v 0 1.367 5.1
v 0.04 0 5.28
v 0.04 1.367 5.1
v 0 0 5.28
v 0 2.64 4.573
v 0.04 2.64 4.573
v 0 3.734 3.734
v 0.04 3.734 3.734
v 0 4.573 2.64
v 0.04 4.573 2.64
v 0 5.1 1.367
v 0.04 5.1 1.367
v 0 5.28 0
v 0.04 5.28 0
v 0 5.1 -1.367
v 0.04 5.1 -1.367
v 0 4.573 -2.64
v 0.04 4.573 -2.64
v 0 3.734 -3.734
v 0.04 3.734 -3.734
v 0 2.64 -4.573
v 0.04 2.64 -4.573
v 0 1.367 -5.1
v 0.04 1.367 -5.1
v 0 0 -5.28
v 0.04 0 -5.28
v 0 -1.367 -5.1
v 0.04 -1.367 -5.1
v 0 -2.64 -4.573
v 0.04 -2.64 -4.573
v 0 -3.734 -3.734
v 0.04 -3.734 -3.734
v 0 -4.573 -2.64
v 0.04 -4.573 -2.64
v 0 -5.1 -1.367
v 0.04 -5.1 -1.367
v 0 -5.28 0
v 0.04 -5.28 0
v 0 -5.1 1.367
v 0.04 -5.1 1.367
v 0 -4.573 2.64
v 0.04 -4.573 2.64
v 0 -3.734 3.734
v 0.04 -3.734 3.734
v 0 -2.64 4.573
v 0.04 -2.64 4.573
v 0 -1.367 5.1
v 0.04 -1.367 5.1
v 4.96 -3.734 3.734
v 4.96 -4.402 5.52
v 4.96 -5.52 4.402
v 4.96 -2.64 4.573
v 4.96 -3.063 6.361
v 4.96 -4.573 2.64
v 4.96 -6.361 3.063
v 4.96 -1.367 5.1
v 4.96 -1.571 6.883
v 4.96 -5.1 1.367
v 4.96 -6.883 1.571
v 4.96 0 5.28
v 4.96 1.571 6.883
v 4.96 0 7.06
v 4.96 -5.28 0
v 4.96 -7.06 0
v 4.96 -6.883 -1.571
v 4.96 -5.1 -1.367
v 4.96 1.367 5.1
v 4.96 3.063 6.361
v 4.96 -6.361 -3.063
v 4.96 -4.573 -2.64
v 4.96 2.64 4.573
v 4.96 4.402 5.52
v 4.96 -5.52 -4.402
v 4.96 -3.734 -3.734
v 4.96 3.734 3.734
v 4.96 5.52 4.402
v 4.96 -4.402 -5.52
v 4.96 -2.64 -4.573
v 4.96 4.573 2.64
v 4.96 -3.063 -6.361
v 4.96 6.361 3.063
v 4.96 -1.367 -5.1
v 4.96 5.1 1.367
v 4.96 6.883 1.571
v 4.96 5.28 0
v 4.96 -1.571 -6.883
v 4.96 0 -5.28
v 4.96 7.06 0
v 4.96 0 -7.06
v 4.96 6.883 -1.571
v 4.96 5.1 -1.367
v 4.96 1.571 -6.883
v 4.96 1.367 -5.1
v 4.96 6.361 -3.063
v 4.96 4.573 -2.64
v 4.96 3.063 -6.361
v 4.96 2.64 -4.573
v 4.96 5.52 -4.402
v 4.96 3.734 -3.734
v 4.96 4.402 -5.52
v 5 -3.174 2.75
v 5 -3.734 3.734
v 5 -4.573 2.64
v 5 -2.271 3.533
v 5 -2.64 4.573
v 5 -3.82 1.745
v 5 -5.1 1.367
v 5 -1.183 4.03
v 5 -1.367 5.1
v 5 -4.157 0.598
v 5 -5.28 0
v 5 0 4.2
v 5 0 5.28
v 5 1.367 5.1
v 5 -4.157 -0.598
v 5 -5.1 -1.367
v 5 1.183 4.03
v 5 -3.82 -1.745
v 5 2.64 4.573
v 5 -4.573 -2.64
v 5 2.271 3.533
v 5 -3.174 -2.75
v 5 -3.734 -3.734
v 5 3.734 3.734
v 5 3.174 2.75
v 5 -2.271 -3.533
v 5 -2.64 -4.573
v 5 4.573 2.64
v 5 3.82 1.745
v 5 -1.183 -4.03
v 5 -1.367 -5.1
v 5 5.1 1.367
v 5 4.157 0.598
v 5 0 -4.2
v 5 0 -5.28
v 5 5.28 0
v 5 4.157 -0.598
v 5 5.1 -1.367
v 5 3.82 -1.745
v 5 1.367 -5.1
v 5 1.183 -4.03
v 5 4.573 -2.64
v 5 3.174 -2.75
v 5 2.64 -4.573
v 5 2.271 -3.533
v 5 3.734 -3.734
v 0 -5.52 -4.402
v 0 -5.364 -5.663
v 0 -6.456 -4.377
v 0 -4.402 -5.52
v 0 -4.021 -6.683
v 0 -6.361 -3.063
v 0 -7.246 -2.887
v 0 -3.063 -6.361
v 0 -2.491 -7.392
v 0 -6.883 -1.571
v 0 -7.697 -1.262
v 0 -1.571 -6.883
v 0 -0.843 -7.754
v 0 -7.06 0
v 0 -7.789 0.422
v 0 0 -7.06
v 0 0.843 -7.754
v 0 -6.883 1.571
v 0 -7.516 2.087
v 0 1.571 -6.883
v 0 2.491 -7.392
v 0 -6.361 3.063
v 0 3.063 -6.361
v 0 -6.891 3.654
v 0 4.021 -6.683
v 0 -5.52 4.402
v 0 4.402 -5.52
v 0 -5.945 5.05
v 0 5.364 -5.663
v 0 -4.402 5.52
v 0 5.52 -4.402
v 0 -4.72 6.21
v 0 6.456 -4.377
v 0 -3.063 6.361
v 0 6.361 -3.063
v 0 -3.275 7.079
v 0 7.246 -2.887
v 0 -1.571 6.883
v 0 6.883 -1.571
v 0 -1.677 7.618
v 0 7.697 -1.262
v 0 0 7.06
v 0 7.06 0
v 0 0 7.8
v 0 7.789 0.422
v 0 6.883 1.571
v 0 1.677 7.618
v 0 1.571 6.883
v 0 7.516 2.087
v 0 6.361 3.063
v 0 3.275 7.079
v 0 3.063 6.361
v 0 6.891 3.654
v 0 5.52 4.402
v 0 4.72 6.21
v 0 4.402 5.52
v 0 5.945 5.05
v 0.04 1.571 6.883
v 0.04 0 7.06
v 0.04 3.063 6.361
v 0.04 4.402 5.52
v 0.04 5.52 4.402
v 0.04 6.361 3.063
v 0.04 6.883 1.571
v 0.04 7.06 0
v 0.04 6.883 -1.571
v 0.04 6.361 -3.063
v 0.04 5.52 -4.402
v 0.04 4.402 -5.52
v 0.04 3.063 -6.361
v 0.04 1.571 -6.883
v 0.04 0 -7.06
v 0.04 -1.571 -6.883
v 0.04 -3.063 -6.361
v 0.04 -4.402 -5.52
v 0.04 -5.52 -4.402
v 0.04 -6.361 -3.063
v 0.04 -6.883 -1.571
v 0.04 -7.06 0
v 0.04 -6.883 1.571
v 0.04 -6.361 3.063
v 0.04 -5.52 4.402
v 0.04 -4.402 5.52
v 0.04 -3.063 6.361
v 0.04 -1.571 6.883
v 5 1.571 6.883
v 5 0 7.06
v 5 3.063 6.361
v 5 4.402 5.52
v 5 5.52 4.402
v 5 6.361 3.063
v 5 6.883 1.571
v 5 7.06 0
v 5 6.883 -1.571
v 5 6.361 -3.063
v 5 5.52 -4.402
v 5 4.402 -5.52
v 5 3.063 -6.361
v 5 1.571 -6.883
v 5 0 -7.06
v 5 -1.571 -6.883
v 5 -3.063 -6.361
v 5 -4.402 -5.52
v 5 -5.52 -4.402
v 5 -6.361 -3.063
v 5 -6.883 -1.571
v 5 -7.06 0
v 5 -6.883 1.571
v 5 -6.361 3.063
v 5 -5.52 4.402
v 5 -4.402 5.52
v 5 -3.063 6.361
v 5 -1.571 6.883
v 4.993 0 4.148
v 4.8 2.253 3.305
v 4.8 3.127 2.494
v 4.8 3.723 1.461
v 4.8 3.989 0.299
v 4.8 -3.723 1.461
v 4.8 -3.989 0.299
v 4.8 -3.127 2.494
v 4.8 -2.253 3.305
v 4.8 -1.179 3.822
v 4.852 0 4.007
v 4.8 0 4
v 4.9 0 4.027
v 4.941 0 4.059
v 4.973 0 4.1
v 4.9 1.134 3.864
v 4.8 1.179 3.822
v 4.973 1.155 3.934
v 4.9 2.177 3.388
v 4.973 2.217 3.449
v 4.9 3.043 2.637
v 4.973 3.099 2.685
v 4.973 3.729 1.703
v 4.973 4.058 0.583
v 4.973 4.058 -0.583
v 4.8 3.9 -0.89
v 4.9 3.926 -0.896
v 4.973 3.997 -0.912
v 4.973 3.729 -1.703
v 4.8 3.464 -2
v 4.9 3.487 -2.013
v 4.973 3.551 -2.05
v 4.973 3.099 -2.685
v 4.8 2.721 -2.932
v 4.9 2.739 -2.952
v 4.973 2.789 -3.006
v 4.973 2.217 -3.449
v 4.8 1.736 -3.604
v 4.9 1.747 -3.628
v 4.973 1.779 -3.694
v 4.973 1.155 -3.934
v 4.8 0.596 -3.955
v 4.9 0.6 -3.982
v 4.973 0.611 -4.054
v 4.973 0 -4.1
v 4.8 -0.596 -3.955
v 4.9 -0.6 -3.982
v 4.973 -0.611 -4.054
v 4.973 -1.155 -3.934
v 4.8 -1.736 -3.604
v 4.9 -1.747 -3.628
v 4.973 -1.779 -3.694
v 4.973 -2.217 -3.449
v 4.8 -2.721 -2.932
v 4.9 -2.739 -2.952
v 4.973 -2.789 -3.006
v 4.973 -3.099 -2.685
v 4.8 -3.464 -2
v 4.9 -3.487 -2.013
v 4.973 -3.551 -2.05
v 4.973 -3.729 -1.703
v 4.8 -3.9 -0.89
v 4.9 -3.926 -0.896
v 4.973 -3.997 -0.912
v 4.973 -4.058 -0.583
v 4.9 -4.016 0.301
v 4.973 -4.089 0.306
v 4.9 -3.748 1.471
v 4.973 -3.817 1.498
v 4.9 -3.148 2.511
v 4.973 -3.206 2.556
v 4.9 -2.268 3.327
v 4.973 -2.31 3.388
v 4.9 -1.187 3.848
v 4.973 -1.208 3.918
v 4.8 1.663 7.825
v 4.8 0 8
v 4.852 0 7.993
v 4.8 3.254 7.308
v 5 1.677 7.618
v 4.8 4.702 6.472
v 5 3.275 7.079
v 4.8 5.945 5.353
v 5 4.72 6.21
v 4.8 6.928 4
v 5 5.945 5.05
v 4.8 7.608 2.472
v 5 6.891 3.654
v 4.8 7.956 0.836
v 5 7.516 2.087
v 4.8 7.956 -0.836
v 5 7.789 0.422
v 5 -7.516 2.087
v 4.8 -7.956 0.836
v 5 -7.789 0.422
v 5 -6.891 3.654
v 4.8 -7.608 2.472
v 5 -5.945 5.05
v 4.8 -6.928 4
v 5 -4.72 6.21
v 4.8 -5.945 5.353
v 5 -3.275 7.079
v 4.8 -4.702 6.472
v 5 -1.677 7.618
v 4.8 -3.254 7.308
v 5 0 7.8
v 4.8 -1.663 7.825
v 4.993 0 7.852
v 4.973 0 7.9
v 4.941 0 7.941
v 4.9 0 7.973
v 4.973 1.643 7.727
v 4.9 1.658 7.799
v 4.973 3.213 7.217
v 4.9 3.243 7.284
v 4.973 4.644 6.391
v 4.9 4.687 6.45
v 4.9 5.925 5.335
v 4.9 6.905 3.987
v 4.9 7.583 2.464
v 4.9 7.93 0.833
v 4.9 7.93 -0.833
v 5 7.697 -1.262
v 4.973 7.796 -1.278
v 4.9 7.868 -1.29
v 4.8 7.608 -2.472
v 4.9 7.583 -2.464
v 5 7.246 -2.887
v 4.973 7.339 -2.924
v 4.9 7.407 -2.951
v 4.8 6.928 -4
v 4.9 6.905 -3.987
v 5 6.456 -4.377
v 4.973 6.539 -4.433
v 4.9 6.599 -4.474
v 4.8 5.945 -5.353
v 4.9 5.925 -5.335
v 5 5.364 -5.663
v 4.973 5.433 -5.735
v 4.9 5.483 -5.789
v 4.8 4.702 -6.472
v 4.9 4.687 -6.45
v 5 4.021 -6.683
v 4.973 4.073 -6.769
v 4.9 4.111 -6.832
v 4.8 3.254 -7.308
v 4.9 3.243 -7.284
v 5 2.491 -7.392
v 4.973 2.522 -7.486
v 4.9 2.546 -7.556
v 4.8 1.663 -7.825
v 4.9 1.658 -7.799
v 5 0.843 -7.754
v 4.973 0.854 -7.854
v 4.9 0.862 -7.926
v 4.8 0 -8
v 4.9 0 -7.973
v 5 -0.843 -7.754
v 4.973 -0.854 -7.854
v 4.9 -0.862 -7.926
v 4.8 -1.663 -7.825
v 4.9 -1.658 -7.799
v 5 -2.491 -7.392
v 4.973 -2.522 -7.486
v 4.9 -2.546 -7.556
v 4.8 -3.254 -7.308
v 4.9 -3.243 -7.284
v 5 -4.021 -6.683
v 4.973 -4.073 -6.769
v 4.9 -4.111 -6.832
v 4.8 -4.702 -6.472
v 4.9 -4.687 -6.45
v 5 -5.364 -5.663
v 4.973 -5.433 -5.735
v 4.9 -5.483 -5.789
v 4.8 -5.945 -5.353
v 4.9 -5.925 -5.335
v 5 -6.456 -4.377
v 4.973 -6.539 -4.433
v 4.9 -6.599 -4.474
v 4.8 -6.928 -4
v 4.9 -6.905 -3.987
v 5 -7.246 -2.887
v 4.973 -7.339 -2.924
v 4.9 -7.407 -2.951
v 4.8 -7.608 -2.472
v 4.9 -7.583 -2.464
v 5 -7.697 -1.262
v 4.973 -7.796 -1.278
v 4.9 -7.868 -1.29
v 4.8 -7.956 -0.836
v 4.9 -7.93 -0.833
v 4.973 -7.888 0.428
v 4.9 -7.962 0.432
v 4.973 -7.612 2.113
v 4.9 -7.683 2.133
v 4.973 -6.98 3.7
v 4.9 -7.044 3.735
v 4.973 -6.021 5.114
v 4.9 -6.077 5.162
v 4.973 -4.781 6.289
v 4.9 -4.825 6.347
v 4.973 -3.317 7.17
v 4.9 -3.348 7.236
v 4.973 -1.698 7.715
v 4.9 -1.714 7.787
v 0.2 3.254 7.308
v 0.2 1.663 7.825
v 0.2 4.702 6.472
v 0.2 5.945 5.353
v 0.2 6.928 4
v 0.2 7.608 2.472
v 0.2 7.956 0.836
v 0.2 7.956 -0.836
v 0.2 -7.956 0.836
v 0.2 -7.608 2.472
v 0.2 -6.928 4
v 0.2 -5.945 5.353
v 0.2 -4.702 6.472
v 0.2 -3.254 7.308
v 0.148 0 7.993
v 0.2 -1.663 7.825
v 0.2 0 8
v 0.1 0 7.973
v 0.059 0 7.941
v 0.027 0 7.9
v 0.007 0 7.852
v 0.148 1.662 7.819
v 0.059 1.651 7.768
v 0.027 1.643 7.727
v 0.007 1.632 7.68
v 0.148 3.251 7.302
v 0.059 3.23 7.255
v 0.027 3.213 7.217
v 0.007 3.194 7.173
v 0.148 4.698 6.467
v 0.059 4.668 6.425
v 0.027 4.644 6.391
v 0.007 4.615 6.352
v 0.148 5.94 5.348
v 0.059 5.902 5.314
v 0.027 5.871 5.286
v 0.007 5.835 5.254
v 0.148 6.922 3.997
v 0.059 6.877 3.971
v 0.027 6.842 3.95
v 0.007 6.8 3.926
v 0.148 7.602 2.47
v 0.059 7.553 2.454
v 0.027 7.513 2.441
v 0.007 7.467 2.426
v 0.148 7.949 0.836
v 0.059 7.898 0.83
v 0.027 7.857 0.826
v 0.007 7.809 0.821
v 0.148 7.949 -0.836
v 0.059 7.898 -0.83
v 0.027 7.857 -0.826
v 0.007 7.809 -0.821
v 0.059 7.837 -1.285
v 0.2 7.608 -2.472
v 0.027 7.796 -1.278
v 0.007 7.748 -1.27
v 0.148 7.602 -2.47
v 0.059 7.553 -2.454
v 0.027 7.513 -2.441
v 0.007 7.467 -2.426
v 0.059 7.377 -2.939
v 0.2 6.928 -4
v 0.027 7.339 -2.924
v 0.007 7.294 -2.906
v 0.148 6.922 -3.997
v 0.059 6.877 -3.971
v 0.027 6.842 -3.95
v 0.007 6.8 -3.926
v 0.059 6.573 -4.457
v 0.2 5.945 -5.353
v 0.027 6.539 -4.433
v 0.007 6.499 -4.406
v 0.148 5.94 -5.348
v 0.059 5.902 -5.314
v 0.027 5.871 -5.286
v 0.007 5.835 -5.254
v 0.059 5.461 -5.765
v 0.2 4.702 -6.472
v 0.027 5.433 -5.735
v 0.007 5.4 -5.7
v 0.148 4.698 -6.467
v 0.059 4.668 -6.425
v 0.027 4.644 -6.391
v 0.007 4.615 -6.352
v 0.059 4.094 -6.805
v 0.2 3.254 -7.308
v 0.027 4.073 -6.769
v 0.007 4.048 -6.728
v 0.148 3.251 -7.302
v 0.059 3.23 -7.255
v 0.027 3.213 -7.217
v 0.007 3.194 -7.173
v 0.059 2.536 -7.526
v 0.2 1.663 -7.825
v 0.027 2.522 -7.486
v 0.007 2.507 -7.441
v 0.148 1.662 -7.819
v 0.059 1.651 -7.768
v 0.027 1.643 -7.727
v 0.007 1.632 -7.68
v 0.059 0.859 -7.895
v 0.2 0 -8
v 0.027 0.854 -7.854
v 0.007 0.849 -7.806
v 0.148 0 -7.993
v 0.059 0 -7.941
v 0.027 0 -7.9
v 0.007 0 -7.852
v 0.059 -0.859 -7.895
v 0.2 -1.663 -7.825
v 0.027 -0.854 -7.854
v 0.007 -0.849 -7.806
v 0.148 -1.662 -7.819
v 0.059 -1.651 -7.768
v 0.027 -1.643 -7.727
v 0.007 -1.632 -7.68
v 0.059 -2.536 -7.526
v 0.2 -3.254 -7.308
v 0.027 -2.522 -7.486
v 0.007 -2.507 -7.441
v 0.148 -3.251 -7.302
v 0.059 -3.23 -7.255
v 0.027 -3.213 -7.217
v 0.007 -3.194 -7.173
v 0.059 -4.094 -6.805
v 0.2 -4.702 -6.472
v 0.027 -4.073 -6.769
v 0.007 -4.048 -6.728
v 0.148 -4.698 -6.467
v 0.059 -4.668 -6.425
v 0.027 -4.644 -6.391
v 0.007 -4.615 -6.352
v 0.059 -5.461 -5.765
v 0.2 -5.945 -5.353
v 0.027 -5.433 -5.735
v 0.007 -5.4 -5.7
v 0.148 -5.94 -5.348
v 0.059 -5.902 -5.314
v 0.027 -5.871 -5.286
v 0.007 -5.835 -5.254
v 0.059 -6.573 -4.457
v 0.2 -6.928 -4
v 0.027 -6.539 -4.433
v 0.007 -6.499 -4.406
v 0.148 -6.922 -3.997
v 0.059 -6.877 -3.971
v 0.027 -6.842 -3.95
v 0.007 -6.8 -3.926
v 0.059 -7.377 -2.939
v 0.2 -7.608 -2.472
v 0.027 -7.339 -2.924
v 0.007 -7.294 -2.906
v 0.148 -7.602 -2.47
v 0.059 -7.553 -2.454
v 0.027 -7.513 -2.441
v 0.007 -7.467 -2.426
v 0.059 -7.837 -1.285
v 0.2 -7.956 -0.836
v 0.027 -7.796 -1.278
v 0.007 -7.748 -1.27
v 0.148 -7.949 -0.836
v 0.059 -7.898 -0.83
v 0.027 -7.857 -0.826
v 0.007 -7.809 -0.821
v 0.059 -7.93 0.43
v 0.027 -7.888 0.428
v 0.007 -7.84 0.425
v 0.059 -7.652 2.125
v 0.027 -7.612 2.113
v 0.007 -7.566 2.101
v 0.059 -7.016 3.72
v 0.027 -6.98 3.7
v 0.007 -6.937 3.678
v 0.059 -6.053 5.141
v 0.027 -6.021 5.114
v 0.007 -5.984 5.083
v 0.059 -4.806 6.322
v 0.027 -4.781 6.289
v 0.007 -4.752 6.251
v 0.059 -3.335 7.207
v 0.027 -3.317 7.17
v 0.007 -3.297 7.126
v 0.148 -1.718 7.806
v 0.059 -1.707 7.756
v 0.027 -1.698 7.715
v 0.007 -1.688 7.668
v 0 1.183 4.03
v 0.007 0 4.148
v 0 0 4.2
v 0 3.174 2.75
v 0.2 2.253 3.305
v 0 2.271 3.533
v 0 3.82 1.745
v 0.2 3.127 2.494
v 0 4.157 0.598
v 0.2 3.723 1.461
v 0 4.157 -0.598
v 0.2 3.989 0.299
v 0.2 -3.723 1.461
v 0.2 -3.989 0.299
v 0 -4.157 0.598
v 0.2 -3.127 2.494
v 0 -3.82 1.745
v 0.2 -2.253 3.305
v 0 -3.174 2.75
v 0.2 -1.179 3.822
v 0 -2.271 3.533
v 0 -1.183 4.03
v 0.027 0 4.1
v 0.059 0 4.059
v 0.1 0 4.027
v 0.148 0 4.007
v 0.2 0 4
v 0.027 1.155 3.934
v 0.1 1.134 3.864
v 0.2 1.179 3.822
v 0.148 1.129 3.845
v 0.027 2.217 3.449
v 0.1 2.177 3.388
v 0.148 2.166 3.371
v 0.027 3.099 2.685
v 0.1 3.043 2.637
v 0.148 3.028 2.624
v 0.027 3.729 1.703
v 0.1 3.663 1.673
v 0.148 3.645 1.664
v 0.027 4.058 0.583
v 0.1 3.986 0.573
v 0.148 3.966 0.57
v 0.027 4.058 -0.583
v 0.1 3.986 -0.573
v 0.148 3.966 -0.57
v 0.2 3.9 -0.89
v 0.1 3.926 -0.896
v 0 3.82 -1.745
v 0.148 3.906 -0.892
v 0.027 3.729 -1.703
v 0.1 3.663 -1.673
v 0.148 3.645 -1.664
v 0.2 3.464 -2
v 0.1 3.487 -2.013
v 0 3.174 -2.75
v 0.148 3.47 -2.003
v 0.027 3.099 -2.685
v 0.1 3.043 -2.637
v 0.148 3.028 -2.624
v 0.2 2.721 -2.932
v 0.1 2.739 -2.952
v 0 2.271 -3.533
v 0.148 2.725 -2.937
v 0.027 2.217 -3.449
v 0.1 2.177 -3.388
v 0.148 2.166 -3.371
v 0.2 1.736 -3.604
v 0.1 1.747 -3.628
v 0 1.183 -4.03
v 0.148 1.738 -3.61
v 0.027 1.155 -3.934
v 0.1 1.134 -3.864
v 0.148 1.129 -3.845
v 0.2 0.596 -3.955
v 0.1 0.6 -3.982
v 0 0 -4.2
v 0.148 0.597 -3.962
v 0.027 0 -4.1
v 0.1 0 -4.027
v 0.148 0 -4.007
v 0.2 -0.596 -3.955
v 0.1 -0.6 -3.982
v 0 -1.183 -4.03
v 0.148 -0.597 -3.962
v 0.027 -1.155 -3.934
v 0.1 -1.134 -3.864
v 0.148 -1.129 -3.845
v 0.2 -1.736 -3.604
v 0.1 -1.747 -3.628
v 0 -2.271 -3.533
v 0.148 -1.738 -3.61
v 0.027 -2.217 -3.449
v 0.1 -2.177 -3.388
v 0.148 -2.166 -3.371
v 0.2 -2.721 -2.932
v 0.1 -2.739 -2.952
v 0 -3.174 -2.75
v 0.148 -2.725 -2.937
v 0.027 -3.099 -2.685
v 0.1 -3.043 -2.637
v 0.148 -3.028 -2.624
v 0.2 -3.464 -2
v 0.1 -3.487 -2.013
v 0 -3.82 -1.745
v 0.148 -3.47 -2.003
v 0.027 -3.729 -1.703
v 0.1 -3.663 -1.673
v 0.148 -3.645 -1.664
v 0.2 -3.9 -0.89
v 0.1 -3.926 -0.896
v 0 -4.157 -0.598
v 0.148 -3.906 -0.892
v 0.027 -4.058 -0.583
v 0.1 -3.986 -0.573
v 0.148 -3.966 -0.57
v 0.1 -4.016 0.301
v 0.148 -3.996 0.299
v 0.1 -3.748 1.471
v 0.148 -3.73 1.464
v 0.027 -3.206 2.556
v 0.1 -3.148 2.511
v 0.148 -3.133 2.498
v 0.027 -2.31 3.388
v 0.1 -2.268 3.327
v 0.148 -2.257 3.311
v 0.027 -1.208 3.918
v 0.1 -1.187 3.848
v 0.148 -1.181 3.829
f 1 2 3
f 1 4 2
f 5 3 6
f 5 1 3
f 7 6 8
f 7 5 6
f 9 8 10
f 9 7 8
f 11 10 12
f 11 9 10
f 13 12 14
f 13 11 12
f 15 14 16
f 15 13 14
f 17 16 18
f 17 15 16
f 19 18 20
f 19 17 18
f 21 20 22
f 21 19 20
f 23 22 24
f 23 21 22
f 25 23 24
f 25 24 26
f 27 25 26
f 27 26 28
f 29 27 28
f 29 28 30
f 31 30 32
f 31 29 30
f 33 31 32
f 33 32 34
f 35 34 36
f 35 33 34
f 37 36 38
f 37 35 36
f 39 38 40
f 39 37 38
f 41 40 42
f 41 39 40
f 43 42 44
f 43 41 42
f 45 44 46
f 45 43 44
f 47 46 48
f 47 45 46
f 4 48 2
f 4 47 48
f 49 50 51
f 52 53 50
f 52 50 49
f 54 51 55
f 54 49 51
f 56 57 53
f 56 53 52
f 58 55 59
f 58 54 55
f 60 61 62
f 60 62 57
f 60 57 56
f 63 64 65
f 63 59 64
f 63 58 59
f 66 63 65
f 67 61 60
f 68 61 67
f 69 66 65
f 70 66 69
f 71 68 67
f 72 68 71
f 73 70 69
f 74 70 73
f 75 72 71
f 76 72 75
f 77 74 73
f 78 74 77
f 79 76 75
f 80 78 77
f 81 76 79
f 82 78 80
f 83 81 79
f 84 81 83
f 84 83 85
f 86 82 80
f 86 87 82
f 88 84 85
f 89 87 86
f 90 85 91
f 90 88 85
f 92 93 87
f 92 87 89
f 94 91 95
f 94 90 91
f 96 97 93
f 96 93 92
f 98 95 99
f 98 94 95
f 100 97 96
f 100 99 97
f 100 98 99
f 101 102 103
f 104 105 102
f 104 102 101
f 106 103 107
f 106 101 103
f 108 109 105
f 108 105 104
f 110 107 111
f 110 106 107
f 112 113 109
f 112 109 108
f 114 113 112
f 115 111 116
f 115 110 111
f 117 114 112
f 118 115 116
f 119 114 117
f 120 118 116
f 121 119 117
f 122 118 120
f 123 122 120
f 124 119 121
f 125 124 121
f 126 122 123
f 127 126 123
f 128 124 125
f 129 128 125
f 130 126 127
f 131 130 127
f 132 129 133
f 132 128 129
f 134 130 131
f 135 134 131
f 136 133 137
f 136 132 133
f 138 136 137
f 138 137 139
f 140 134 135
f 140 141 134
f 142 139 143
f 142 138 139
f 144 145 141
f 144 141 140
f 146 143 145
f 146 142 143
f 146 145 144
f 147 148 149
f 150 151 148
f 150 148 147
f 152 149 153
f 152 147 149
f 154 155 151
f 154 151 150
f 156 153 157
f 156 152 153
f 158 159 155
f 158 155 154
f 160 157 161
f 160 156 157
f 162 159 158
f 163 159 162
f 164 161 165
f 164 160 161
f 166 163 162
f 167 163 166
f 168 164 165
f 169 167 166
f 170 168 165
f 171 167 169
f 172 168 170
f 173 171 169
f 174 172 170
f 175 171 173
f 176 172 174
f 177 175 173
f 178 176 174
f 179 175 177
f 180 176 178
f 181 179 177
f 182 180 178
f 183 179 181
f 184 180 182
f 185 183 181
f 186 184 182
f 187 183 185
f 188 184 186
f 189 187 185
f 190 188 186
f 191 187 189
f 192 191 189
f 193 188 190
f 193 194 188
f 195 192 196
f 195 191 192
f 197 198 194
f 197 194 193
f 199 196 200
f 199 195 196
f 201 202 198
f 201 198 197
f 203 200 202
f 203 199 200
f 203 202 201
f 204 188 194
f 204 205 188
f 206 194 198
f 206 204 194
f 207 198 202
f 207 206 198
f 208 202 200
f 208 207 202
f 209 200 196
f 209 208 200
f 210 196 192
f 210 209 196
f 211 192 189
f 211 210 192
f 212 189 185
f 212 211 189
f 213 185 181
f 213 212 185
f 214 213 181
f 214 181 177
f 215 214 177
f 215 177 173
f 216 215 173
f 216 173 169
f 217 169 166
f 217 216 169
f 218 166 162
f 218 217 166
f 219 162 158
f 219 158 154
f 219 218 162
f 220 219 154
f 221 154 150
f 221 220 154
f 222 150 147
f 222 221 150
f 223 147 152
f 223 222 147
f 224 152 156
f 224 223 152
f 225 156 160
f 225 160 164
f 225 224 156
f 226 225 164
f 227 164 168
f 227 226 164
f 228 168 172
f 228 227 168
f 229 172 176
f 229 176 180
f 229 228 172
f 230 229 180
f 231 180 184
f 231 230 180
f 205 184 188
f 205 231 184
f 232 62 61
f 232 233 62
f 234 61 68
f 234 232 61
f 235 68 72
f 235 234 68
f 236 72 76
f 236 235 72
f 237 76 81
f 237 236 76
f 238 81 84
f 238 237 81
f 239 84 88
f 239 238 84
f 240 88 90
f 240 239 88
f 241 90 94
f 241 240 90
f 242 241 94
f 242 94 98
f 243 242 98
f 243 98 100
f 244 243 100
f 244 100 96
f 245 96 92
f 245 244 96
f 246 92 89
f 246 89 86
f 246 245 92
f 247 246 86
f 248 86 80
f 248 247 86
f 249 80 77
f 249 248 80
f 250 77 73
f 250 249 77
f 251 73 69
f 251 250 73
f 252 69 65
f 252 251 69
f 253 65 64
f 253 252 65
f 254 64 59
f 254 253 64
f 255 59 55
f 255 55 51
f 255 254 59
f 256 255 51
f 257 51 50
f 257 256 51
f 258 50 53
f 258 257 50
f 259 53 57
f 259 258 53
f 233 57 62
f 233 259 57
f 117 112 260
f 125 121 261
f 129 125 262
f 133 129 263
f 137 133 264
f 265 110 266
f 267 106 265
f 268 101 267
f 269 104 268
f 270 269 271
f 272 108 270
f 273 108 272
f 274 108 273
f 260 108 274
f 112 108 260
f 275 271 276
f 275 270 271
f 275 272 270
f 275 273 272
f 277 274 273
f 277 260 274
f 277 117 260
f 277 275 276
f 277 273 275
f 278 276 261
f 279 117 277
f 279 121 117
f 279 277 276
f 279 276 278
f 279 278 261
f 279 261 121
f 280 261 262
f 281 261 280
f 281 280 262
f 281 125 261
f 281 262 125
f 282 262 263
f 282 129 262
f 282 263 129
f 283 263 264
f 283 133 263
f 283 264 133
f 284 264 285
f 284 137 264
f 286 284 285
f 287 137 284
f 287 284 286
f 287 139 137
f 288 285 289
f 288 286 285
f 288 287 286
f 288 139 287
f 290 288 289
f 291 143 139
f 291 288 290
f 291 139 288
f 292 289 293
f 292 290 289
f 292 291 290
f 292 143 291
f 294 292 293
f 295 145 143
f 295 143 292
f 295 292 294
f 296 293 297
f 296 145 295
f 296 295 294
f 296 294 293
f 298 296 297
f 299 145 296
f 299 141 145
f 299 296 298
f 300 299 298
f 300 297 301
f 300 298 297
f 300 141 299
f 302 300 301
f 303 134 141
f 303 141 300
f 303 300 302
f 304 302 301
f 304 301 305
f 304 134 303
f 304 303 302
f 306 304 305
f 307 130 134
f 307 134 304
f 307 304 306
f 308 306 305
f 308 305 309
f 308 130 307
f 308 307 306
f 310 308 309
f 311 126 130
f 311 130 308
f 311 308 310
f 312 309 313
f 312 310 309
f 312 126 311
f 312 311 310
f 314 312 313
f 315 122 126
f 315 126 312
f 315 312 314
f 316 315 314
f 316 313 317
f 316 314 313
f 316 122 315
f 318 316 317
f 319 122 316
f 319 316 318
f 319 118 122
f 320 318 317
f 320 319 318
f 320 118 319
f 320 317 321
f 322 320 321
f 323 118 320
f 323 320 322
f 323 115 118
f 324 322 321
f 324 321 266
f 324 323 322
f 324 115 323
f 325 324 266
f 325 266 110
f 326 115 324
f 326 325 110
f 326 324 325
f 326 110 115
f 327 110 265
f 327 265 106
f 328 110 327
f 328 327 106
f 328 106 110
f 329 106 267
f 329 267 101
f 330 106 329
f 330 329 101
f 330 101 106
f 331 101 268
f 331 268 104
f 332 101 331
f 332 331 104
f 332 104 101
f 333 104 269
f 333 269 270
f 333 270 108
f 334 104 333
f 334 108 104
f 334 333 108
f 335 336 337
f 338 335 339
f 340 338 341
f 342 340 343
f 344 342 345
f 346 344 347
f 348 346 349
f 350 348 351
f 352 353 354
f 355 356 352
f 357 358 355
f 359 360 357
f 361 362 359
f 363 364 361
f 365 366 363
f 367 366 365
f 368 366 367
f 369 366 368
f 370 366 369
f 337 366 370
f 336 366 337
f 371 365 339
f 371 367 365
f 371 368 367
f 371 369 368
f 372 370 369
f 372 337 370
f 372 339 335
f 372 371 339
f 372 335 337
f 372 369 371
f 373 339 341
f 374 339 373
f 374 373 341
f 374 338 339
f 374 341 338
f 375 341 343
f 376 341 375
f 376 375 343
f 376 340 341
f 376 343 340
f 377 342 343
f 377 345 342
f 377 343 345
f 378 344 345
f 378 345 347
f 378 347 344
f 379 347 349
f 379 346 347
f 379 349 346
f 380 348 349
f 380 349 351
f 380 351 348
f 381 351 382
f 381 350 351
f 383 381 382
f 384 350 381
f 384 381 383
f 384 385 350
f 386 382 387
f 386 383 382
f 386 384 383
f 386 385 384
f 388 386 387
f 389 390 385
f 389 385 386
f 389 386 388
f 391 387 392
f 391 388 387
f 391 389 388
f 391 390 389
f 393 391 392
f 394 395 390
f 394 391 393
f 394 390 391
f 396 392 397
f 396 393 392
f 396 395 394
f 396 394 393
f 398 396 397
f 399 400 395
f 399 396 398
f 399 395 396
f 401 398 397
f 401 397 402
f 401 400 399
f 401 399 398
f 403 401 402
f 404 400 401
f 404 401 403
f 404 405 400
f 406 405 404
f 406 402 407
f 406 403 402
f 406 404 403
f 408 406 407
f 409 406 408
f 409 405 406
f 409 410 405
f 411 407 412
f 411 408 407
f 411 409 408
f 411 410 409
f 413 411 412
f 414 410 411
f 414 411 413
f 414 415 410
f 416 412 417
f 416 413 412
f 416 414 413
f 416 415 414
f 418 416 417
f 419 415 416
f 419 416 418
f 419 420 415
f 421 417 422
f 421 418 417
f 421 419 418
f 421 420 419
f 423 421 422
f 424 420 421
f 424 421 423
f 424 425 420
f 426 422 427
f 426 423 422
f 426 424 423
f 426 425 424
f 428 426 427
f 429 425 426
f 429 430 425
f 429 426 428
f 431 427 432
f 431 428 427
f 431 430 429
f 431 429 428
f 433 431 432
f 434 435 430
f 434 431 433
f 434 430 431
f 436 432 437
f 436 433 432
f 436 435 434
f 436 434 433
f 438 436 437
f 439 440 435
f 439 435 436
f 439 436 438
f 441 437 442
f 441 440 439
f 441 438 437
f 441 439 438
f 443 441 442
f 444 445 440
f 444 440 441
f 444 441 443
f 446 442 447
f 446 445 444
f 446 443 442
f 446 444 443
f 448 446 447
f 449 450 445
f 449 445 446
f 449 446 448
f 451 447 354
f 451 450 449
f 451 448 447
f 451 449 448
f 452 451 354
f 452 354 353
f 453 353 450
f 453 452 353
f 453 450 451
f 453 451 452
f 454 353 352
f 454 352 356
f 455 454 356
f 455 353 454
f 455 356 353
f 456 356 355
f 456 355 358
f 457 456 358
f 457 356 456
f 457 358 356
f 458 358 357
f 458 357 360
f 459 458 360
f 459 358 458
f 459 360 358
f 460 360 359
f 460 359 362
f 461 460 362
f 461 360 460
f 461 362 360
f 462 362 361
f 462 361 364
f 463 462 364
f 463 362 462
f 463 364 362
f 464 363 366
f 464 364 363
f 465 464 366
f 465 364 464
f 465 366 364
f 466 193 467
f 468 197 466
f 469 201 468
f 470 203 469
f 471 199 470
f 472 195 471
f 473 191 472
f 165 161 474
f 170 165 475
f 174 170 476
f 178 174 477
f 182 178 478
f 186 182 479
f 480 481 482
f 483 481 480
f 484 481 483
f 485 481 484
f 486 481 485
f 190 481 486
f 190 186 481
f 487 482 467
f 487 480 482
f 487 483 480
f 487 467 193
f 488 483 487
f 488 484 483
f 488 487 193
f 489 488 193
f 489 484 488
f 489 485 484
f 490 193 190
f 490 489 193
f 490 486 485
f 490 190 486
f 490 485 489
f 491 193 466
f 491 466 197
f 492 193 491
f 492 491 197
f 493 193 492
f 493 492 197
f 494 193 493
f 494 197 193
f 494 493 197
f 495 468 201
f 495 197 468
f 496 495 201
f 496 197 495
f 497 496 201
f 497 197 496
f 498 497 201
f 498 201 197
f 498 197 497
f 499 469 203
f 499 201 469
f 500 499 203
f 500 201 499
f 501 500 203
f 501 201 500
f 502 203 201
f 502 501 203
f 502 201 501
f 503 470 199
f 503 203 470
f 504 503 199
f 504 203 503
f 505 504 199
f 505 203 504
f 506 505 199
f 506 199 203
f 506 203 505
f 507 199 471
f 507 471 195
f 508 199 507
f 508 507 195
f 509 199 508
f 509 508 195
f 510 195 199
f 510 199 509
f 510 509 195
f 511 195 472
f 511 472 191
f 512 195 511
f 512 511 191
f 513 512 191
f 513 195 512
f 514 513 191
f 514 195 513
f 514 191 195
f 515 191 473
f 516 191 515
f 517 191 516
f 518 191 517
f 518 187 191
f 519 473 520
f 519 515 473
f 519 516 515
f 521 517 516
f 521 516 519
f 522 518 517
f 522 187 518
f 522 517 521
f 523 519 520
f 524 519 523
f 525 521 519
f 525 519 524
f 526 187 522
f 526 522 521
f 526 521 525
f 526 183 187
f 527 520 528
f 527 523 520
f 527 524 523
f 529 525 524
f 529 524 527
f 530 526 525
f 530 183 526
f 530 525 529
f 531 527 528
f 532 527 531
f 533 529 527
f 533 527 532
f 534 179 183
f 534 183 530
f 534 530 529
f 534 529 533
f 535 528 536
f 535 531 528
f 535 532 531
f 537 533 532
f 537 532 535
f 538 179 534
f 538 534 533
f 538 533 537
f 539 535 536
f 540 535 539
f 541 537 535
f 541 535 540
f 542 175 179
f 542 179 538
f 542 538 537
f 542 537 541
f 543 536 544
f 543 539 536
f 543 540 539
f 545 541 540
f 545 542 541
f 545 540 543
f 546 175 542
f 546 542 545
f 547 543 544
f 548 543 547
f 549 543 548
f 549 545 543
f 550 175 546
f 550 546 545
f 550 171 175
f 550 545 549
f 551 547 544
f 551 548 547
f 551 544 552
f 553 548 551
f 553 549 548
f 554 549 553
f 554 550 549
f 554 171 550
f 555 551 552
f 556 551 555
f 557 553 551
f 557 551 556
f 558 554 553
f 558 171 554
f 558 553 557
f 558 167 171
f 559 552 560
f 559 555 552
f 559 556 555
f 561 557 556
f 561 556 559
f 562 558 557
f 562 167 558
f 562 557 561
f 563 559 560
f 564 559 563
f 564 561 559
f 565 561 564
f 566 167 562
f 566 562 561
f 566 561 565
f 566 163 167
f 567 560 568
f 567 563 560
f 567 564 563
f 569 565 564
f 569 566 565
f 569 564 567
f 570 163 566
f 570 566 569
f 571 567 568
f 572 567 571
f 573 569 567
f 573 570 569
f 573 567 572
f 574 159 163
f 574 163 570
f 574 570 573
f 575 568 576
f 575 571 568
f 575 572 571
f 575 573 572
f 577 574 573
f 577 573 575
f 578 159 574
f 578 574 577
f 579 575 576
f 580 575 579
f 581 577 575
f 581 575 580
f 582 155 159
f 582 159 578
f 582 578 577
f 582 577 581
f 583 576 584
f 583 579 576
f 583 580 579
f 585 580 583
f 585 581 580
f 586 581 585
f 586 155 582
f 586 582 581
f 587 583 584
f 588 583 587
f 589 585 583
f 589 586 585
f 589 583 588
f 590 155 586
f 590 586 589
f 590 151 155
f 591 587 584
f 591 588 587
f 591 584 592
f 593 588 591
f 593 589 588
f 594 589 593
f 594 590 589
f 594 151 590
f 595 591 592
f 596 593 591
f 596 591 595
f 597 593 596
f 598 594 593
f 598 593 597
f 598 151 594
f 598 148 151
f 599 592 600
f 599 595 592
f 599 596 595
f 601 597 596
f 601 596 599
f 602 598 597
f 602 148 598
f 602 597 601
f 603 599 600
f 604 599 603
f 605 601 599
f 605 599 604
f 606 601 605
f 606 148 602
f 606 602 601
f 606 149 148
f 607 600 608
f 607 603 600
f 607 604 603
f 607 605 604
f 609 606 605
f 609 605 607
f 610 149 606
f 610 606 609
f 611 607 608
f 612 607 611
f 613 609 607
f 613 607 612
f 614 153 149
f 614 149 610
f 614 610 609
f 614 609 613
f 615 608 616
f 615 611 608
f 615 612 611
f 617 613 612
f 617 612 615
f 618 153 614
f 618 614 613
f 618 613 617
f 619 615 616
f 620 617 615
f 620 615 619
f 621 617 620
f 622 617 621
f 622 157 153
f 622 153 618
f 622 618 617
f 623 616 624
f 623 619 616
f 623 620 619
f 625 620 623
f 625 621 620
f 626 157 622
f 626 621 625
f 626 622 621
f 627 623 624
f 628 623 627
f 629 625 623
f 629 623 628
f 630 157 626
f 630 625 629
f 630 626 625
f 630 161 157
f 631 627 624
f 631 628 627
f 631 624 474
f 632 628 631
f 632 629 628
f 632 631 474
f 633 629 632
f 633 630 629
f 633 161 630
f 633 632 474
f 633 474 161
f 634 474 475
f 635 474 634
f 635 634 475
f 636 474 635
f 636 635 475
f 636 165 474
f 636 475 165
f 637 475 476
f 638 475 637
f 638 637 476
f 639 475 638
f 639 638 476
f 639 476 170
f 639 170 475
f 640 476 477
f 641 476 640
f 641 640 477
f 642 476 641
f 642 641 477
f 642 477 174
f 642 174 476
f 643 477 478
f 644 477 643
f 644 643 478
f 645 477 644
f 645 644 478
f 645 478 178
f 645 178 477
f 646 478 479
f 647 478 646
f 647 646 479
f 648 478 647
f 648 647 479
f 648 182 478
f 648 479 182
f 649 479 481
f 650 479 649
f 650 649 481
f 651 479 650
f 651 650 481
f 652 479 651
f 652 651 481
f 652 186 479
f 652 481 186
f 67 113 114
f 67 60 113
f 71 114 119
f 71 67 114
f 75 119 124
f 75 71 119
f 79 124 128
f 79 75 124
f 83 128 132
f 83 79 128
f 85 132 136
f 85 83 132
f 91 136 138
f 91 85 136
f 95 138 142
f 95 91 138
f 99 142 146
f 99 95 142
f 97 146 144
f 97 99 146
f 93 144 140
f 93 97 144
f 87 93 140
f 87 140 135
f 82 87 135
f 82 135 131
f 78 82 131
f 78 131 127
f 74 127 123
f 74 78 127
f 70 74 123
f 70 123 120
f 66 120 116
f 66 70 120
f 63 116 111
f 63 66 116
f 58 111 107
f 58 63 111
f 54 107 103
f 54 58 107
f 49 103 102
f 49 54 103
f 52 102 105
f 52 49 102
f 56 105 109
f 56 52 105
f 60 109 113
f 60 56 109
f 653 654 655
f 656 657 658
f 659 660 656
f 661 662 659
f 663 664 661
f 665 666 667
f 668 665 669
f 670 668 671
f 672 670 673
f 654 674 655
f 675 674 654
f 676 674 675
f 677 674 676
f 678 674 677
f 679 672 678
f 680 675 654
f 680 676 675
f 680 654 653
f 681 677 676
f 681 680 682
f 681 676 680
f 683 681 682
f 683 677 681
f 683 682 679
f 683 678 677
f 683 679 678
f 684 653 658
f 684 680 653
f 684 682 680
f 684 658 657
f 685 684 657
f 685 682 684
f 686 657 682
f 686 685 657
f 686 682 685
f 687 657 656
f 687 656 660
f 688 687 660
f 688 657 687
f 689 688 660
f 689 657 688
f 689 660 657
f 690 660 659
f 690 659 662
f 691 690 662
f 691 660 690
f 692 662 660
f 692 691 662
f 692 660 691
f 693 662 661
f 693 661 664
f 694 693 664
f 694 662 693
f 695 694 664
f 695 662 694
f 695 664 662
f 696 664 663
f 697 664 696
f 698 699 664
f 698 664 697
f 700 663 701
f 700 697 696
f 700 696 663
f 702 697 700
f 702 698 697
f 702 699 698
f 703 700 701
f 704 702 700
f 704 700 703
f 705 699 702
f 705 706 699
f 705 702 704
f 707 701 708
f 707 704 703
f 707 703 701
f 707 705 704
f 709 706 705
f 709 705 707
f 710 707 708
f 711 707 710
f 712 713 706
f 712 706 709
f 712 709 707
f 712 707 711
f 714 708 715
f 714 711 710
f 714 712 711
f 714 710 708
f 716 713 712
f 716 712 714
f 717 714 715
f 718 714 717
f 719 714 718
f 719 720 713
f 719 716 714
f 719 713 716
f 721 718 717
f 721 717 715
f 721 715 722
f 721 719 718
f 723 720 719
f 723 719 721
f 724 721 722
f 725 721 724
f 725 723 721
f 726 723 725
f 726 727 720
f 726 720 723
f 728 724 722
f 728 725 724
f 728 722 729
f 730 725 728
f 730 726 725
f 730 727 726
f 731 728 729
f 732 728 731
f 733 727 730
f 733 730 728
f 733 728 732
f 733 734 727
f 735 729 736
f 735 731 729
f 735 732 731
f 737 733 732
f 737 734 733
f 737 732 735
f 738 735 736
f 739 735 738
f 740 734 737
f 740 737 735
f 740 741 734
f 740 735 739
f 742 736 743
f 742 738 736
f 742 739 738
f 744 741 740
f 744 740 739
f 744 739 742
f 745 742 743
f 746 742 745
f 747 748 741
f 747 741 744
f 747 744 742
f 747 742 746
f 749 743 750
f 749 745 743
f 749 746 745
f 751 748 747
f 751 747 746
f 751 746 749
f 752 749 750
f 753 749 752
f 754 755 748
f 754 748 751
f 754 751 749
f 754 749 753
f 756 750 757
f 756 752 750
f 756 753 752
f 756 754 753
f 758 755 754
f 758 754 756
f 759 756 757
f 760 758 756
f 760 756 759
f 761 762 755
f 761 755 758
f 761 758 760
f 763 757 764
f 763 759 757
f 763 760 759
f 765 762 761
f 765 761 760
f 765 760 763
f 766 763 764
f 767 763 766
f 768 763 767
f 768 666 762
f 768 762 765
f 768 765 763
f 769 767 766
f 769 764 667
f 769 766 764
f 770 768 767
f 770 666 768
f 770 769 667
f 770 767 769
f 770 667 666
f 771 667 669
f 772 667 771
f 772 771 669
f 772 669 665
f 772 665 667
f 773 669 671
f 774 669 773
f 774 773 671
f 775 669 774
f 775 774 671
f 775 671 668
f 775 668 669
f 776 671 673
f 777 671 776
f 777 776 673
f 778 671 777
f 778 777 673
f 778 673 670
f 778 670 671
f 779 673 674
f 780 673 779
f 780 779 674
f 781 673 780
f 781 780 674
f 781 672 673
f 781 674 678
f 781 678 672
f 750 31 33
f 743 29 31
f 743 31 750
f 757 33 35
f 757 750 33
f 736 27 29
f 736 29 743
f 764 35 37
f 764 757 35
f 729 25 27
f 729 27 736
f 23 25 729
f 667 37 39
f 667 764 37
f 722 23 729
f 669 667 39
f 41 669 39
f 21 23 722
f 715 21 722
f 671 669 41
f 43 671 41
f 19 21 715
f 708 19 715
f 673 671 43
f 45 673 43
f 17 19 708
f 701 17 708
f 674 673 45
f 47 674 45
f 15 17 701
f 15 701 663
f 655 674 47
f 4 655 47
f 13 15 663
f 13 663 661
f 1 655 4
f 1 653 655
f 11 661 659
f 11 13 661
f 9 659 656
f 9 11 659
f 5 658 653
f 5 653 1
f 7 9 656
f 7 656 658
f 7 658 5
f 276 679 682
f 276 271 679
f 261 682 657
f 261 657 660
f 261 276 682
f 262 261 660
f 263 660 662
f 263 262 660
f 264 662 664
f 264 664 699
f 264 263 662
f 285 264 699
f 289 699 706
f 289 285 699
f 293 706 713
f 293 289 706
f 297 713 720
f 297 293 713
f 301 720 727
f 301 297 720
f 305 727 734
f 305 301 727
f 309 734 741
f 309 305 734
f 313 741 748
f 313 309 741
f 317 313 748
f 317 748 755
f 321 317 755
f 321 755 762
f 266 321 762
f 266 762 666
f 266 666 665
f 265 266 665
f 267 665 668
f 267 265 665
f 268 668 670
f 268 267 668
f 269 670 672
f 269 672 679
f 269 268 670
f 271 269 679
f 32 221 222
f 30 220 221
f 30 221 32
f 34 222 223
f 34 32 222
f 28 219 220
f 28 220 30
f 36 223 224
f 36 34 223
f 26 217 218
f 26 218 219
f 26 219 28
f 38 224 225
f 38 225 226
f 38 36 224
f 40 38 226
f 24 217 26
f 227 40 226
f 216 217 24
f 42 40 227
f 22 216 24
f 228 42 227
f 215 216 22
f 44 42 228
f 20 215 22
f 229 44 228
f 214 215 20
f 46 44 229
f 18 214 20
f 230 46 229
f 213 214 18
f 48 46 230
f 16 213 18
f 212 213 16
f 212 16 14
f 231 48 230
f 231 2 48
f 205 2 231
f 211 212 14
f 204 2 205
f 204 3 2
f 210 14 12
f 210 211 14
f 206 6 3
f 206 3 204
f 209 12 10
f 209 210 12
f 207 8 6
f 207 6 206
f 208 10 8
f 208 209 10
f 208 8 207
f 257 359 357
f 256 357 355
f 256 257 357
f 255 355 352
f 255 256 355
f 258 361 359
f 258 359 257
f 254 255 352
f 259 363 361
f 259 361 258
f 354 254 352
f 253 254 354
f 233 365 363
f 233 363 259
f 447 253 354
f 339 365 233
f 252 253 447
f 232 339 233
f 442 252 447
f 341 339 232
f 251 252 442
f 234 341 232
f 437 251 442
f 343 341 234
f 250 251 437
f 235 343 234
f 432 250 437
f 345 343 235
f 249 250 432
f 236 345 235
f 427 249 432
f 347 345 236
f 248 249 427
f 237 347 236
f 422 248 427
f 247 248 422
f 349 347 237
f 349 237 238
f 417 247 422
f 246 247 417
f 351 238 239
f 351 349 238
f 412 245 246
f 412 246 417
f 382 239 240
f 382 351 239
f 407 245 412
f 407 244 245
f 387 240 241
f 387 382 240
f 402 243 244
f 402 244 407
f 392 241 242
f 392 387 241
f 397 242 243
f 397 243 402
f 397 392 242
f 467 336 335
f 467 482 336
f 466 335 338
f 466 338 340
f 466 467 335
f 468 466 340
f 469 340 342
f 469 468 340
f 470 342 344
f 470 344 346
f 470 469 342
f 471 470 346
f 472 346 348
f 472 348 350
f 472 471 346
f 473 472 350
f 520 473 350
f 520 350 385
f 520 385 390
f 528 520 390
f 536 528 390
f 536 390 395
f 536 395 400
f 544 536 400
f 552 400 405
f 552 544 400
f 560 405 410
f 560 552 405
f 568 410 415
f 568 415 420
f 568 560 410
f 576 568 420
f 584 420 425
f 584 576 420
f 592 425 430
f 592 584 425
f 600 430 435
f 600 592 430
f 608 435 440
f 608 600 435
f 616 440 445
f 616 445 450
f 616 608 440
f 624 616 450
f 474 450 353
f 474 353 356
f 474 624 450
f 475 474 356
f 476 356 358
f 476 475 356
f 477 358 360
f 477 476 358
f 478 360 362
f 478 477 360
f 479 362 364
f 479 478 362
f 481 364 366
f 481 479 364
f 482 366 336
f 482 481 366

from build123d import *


with BuildPart() as part:
    # Sketch1 → Revolve1 (revolve)
    with BuildSketch(Plane.XY, mode=Mode.PRIVATE) as revolve1_sk:
        with BuildLine():
            Line((0.2, 4), (4.8, 4))
            ThreePointArc((4.8, 4), (4.941421356, 4.058578644), (5, 4.2))
            Line((5, 4.2), (5, 5.28))
            Line((5, 5.28), (4.96, 5.28))
            Line((4.96, 5.28), (4.96, 7.06))
            Line((4.96, 7.06), (5, 7.06))
            Line((5, 7.06), (5, 7.8))
            ThreePointArc((5, 7.8), (4.941421356, 7.941421356), (4.8, 8))
            Line((4.8, 8), (0.2, 8))
            ThreePointArc((0.2, 8), (0.058578644, 7.941421356), (0, 7.8))
            Line((0, 7.8), (0, 7.06))
            Line((0, 7.06), (0.04, 7.06))
            Line((0.04, 7.06), (0.04, 5.28))
            Line((0.04, 5.28), (0, 5.28))
            Line((0, 5.28), (0, 4.2))
            ThreePointArc((0, 4.2), (0.058578644, 4.058578644), (0.2, 4))
        make_face()
    revolve(revolve1_sk.sketch.rotate(Axis((50, 0, 0), (-1, 0, 0)), 270), axis=Axis((50, 0, 0), (-1, 0, 0)))


solid = part.part
